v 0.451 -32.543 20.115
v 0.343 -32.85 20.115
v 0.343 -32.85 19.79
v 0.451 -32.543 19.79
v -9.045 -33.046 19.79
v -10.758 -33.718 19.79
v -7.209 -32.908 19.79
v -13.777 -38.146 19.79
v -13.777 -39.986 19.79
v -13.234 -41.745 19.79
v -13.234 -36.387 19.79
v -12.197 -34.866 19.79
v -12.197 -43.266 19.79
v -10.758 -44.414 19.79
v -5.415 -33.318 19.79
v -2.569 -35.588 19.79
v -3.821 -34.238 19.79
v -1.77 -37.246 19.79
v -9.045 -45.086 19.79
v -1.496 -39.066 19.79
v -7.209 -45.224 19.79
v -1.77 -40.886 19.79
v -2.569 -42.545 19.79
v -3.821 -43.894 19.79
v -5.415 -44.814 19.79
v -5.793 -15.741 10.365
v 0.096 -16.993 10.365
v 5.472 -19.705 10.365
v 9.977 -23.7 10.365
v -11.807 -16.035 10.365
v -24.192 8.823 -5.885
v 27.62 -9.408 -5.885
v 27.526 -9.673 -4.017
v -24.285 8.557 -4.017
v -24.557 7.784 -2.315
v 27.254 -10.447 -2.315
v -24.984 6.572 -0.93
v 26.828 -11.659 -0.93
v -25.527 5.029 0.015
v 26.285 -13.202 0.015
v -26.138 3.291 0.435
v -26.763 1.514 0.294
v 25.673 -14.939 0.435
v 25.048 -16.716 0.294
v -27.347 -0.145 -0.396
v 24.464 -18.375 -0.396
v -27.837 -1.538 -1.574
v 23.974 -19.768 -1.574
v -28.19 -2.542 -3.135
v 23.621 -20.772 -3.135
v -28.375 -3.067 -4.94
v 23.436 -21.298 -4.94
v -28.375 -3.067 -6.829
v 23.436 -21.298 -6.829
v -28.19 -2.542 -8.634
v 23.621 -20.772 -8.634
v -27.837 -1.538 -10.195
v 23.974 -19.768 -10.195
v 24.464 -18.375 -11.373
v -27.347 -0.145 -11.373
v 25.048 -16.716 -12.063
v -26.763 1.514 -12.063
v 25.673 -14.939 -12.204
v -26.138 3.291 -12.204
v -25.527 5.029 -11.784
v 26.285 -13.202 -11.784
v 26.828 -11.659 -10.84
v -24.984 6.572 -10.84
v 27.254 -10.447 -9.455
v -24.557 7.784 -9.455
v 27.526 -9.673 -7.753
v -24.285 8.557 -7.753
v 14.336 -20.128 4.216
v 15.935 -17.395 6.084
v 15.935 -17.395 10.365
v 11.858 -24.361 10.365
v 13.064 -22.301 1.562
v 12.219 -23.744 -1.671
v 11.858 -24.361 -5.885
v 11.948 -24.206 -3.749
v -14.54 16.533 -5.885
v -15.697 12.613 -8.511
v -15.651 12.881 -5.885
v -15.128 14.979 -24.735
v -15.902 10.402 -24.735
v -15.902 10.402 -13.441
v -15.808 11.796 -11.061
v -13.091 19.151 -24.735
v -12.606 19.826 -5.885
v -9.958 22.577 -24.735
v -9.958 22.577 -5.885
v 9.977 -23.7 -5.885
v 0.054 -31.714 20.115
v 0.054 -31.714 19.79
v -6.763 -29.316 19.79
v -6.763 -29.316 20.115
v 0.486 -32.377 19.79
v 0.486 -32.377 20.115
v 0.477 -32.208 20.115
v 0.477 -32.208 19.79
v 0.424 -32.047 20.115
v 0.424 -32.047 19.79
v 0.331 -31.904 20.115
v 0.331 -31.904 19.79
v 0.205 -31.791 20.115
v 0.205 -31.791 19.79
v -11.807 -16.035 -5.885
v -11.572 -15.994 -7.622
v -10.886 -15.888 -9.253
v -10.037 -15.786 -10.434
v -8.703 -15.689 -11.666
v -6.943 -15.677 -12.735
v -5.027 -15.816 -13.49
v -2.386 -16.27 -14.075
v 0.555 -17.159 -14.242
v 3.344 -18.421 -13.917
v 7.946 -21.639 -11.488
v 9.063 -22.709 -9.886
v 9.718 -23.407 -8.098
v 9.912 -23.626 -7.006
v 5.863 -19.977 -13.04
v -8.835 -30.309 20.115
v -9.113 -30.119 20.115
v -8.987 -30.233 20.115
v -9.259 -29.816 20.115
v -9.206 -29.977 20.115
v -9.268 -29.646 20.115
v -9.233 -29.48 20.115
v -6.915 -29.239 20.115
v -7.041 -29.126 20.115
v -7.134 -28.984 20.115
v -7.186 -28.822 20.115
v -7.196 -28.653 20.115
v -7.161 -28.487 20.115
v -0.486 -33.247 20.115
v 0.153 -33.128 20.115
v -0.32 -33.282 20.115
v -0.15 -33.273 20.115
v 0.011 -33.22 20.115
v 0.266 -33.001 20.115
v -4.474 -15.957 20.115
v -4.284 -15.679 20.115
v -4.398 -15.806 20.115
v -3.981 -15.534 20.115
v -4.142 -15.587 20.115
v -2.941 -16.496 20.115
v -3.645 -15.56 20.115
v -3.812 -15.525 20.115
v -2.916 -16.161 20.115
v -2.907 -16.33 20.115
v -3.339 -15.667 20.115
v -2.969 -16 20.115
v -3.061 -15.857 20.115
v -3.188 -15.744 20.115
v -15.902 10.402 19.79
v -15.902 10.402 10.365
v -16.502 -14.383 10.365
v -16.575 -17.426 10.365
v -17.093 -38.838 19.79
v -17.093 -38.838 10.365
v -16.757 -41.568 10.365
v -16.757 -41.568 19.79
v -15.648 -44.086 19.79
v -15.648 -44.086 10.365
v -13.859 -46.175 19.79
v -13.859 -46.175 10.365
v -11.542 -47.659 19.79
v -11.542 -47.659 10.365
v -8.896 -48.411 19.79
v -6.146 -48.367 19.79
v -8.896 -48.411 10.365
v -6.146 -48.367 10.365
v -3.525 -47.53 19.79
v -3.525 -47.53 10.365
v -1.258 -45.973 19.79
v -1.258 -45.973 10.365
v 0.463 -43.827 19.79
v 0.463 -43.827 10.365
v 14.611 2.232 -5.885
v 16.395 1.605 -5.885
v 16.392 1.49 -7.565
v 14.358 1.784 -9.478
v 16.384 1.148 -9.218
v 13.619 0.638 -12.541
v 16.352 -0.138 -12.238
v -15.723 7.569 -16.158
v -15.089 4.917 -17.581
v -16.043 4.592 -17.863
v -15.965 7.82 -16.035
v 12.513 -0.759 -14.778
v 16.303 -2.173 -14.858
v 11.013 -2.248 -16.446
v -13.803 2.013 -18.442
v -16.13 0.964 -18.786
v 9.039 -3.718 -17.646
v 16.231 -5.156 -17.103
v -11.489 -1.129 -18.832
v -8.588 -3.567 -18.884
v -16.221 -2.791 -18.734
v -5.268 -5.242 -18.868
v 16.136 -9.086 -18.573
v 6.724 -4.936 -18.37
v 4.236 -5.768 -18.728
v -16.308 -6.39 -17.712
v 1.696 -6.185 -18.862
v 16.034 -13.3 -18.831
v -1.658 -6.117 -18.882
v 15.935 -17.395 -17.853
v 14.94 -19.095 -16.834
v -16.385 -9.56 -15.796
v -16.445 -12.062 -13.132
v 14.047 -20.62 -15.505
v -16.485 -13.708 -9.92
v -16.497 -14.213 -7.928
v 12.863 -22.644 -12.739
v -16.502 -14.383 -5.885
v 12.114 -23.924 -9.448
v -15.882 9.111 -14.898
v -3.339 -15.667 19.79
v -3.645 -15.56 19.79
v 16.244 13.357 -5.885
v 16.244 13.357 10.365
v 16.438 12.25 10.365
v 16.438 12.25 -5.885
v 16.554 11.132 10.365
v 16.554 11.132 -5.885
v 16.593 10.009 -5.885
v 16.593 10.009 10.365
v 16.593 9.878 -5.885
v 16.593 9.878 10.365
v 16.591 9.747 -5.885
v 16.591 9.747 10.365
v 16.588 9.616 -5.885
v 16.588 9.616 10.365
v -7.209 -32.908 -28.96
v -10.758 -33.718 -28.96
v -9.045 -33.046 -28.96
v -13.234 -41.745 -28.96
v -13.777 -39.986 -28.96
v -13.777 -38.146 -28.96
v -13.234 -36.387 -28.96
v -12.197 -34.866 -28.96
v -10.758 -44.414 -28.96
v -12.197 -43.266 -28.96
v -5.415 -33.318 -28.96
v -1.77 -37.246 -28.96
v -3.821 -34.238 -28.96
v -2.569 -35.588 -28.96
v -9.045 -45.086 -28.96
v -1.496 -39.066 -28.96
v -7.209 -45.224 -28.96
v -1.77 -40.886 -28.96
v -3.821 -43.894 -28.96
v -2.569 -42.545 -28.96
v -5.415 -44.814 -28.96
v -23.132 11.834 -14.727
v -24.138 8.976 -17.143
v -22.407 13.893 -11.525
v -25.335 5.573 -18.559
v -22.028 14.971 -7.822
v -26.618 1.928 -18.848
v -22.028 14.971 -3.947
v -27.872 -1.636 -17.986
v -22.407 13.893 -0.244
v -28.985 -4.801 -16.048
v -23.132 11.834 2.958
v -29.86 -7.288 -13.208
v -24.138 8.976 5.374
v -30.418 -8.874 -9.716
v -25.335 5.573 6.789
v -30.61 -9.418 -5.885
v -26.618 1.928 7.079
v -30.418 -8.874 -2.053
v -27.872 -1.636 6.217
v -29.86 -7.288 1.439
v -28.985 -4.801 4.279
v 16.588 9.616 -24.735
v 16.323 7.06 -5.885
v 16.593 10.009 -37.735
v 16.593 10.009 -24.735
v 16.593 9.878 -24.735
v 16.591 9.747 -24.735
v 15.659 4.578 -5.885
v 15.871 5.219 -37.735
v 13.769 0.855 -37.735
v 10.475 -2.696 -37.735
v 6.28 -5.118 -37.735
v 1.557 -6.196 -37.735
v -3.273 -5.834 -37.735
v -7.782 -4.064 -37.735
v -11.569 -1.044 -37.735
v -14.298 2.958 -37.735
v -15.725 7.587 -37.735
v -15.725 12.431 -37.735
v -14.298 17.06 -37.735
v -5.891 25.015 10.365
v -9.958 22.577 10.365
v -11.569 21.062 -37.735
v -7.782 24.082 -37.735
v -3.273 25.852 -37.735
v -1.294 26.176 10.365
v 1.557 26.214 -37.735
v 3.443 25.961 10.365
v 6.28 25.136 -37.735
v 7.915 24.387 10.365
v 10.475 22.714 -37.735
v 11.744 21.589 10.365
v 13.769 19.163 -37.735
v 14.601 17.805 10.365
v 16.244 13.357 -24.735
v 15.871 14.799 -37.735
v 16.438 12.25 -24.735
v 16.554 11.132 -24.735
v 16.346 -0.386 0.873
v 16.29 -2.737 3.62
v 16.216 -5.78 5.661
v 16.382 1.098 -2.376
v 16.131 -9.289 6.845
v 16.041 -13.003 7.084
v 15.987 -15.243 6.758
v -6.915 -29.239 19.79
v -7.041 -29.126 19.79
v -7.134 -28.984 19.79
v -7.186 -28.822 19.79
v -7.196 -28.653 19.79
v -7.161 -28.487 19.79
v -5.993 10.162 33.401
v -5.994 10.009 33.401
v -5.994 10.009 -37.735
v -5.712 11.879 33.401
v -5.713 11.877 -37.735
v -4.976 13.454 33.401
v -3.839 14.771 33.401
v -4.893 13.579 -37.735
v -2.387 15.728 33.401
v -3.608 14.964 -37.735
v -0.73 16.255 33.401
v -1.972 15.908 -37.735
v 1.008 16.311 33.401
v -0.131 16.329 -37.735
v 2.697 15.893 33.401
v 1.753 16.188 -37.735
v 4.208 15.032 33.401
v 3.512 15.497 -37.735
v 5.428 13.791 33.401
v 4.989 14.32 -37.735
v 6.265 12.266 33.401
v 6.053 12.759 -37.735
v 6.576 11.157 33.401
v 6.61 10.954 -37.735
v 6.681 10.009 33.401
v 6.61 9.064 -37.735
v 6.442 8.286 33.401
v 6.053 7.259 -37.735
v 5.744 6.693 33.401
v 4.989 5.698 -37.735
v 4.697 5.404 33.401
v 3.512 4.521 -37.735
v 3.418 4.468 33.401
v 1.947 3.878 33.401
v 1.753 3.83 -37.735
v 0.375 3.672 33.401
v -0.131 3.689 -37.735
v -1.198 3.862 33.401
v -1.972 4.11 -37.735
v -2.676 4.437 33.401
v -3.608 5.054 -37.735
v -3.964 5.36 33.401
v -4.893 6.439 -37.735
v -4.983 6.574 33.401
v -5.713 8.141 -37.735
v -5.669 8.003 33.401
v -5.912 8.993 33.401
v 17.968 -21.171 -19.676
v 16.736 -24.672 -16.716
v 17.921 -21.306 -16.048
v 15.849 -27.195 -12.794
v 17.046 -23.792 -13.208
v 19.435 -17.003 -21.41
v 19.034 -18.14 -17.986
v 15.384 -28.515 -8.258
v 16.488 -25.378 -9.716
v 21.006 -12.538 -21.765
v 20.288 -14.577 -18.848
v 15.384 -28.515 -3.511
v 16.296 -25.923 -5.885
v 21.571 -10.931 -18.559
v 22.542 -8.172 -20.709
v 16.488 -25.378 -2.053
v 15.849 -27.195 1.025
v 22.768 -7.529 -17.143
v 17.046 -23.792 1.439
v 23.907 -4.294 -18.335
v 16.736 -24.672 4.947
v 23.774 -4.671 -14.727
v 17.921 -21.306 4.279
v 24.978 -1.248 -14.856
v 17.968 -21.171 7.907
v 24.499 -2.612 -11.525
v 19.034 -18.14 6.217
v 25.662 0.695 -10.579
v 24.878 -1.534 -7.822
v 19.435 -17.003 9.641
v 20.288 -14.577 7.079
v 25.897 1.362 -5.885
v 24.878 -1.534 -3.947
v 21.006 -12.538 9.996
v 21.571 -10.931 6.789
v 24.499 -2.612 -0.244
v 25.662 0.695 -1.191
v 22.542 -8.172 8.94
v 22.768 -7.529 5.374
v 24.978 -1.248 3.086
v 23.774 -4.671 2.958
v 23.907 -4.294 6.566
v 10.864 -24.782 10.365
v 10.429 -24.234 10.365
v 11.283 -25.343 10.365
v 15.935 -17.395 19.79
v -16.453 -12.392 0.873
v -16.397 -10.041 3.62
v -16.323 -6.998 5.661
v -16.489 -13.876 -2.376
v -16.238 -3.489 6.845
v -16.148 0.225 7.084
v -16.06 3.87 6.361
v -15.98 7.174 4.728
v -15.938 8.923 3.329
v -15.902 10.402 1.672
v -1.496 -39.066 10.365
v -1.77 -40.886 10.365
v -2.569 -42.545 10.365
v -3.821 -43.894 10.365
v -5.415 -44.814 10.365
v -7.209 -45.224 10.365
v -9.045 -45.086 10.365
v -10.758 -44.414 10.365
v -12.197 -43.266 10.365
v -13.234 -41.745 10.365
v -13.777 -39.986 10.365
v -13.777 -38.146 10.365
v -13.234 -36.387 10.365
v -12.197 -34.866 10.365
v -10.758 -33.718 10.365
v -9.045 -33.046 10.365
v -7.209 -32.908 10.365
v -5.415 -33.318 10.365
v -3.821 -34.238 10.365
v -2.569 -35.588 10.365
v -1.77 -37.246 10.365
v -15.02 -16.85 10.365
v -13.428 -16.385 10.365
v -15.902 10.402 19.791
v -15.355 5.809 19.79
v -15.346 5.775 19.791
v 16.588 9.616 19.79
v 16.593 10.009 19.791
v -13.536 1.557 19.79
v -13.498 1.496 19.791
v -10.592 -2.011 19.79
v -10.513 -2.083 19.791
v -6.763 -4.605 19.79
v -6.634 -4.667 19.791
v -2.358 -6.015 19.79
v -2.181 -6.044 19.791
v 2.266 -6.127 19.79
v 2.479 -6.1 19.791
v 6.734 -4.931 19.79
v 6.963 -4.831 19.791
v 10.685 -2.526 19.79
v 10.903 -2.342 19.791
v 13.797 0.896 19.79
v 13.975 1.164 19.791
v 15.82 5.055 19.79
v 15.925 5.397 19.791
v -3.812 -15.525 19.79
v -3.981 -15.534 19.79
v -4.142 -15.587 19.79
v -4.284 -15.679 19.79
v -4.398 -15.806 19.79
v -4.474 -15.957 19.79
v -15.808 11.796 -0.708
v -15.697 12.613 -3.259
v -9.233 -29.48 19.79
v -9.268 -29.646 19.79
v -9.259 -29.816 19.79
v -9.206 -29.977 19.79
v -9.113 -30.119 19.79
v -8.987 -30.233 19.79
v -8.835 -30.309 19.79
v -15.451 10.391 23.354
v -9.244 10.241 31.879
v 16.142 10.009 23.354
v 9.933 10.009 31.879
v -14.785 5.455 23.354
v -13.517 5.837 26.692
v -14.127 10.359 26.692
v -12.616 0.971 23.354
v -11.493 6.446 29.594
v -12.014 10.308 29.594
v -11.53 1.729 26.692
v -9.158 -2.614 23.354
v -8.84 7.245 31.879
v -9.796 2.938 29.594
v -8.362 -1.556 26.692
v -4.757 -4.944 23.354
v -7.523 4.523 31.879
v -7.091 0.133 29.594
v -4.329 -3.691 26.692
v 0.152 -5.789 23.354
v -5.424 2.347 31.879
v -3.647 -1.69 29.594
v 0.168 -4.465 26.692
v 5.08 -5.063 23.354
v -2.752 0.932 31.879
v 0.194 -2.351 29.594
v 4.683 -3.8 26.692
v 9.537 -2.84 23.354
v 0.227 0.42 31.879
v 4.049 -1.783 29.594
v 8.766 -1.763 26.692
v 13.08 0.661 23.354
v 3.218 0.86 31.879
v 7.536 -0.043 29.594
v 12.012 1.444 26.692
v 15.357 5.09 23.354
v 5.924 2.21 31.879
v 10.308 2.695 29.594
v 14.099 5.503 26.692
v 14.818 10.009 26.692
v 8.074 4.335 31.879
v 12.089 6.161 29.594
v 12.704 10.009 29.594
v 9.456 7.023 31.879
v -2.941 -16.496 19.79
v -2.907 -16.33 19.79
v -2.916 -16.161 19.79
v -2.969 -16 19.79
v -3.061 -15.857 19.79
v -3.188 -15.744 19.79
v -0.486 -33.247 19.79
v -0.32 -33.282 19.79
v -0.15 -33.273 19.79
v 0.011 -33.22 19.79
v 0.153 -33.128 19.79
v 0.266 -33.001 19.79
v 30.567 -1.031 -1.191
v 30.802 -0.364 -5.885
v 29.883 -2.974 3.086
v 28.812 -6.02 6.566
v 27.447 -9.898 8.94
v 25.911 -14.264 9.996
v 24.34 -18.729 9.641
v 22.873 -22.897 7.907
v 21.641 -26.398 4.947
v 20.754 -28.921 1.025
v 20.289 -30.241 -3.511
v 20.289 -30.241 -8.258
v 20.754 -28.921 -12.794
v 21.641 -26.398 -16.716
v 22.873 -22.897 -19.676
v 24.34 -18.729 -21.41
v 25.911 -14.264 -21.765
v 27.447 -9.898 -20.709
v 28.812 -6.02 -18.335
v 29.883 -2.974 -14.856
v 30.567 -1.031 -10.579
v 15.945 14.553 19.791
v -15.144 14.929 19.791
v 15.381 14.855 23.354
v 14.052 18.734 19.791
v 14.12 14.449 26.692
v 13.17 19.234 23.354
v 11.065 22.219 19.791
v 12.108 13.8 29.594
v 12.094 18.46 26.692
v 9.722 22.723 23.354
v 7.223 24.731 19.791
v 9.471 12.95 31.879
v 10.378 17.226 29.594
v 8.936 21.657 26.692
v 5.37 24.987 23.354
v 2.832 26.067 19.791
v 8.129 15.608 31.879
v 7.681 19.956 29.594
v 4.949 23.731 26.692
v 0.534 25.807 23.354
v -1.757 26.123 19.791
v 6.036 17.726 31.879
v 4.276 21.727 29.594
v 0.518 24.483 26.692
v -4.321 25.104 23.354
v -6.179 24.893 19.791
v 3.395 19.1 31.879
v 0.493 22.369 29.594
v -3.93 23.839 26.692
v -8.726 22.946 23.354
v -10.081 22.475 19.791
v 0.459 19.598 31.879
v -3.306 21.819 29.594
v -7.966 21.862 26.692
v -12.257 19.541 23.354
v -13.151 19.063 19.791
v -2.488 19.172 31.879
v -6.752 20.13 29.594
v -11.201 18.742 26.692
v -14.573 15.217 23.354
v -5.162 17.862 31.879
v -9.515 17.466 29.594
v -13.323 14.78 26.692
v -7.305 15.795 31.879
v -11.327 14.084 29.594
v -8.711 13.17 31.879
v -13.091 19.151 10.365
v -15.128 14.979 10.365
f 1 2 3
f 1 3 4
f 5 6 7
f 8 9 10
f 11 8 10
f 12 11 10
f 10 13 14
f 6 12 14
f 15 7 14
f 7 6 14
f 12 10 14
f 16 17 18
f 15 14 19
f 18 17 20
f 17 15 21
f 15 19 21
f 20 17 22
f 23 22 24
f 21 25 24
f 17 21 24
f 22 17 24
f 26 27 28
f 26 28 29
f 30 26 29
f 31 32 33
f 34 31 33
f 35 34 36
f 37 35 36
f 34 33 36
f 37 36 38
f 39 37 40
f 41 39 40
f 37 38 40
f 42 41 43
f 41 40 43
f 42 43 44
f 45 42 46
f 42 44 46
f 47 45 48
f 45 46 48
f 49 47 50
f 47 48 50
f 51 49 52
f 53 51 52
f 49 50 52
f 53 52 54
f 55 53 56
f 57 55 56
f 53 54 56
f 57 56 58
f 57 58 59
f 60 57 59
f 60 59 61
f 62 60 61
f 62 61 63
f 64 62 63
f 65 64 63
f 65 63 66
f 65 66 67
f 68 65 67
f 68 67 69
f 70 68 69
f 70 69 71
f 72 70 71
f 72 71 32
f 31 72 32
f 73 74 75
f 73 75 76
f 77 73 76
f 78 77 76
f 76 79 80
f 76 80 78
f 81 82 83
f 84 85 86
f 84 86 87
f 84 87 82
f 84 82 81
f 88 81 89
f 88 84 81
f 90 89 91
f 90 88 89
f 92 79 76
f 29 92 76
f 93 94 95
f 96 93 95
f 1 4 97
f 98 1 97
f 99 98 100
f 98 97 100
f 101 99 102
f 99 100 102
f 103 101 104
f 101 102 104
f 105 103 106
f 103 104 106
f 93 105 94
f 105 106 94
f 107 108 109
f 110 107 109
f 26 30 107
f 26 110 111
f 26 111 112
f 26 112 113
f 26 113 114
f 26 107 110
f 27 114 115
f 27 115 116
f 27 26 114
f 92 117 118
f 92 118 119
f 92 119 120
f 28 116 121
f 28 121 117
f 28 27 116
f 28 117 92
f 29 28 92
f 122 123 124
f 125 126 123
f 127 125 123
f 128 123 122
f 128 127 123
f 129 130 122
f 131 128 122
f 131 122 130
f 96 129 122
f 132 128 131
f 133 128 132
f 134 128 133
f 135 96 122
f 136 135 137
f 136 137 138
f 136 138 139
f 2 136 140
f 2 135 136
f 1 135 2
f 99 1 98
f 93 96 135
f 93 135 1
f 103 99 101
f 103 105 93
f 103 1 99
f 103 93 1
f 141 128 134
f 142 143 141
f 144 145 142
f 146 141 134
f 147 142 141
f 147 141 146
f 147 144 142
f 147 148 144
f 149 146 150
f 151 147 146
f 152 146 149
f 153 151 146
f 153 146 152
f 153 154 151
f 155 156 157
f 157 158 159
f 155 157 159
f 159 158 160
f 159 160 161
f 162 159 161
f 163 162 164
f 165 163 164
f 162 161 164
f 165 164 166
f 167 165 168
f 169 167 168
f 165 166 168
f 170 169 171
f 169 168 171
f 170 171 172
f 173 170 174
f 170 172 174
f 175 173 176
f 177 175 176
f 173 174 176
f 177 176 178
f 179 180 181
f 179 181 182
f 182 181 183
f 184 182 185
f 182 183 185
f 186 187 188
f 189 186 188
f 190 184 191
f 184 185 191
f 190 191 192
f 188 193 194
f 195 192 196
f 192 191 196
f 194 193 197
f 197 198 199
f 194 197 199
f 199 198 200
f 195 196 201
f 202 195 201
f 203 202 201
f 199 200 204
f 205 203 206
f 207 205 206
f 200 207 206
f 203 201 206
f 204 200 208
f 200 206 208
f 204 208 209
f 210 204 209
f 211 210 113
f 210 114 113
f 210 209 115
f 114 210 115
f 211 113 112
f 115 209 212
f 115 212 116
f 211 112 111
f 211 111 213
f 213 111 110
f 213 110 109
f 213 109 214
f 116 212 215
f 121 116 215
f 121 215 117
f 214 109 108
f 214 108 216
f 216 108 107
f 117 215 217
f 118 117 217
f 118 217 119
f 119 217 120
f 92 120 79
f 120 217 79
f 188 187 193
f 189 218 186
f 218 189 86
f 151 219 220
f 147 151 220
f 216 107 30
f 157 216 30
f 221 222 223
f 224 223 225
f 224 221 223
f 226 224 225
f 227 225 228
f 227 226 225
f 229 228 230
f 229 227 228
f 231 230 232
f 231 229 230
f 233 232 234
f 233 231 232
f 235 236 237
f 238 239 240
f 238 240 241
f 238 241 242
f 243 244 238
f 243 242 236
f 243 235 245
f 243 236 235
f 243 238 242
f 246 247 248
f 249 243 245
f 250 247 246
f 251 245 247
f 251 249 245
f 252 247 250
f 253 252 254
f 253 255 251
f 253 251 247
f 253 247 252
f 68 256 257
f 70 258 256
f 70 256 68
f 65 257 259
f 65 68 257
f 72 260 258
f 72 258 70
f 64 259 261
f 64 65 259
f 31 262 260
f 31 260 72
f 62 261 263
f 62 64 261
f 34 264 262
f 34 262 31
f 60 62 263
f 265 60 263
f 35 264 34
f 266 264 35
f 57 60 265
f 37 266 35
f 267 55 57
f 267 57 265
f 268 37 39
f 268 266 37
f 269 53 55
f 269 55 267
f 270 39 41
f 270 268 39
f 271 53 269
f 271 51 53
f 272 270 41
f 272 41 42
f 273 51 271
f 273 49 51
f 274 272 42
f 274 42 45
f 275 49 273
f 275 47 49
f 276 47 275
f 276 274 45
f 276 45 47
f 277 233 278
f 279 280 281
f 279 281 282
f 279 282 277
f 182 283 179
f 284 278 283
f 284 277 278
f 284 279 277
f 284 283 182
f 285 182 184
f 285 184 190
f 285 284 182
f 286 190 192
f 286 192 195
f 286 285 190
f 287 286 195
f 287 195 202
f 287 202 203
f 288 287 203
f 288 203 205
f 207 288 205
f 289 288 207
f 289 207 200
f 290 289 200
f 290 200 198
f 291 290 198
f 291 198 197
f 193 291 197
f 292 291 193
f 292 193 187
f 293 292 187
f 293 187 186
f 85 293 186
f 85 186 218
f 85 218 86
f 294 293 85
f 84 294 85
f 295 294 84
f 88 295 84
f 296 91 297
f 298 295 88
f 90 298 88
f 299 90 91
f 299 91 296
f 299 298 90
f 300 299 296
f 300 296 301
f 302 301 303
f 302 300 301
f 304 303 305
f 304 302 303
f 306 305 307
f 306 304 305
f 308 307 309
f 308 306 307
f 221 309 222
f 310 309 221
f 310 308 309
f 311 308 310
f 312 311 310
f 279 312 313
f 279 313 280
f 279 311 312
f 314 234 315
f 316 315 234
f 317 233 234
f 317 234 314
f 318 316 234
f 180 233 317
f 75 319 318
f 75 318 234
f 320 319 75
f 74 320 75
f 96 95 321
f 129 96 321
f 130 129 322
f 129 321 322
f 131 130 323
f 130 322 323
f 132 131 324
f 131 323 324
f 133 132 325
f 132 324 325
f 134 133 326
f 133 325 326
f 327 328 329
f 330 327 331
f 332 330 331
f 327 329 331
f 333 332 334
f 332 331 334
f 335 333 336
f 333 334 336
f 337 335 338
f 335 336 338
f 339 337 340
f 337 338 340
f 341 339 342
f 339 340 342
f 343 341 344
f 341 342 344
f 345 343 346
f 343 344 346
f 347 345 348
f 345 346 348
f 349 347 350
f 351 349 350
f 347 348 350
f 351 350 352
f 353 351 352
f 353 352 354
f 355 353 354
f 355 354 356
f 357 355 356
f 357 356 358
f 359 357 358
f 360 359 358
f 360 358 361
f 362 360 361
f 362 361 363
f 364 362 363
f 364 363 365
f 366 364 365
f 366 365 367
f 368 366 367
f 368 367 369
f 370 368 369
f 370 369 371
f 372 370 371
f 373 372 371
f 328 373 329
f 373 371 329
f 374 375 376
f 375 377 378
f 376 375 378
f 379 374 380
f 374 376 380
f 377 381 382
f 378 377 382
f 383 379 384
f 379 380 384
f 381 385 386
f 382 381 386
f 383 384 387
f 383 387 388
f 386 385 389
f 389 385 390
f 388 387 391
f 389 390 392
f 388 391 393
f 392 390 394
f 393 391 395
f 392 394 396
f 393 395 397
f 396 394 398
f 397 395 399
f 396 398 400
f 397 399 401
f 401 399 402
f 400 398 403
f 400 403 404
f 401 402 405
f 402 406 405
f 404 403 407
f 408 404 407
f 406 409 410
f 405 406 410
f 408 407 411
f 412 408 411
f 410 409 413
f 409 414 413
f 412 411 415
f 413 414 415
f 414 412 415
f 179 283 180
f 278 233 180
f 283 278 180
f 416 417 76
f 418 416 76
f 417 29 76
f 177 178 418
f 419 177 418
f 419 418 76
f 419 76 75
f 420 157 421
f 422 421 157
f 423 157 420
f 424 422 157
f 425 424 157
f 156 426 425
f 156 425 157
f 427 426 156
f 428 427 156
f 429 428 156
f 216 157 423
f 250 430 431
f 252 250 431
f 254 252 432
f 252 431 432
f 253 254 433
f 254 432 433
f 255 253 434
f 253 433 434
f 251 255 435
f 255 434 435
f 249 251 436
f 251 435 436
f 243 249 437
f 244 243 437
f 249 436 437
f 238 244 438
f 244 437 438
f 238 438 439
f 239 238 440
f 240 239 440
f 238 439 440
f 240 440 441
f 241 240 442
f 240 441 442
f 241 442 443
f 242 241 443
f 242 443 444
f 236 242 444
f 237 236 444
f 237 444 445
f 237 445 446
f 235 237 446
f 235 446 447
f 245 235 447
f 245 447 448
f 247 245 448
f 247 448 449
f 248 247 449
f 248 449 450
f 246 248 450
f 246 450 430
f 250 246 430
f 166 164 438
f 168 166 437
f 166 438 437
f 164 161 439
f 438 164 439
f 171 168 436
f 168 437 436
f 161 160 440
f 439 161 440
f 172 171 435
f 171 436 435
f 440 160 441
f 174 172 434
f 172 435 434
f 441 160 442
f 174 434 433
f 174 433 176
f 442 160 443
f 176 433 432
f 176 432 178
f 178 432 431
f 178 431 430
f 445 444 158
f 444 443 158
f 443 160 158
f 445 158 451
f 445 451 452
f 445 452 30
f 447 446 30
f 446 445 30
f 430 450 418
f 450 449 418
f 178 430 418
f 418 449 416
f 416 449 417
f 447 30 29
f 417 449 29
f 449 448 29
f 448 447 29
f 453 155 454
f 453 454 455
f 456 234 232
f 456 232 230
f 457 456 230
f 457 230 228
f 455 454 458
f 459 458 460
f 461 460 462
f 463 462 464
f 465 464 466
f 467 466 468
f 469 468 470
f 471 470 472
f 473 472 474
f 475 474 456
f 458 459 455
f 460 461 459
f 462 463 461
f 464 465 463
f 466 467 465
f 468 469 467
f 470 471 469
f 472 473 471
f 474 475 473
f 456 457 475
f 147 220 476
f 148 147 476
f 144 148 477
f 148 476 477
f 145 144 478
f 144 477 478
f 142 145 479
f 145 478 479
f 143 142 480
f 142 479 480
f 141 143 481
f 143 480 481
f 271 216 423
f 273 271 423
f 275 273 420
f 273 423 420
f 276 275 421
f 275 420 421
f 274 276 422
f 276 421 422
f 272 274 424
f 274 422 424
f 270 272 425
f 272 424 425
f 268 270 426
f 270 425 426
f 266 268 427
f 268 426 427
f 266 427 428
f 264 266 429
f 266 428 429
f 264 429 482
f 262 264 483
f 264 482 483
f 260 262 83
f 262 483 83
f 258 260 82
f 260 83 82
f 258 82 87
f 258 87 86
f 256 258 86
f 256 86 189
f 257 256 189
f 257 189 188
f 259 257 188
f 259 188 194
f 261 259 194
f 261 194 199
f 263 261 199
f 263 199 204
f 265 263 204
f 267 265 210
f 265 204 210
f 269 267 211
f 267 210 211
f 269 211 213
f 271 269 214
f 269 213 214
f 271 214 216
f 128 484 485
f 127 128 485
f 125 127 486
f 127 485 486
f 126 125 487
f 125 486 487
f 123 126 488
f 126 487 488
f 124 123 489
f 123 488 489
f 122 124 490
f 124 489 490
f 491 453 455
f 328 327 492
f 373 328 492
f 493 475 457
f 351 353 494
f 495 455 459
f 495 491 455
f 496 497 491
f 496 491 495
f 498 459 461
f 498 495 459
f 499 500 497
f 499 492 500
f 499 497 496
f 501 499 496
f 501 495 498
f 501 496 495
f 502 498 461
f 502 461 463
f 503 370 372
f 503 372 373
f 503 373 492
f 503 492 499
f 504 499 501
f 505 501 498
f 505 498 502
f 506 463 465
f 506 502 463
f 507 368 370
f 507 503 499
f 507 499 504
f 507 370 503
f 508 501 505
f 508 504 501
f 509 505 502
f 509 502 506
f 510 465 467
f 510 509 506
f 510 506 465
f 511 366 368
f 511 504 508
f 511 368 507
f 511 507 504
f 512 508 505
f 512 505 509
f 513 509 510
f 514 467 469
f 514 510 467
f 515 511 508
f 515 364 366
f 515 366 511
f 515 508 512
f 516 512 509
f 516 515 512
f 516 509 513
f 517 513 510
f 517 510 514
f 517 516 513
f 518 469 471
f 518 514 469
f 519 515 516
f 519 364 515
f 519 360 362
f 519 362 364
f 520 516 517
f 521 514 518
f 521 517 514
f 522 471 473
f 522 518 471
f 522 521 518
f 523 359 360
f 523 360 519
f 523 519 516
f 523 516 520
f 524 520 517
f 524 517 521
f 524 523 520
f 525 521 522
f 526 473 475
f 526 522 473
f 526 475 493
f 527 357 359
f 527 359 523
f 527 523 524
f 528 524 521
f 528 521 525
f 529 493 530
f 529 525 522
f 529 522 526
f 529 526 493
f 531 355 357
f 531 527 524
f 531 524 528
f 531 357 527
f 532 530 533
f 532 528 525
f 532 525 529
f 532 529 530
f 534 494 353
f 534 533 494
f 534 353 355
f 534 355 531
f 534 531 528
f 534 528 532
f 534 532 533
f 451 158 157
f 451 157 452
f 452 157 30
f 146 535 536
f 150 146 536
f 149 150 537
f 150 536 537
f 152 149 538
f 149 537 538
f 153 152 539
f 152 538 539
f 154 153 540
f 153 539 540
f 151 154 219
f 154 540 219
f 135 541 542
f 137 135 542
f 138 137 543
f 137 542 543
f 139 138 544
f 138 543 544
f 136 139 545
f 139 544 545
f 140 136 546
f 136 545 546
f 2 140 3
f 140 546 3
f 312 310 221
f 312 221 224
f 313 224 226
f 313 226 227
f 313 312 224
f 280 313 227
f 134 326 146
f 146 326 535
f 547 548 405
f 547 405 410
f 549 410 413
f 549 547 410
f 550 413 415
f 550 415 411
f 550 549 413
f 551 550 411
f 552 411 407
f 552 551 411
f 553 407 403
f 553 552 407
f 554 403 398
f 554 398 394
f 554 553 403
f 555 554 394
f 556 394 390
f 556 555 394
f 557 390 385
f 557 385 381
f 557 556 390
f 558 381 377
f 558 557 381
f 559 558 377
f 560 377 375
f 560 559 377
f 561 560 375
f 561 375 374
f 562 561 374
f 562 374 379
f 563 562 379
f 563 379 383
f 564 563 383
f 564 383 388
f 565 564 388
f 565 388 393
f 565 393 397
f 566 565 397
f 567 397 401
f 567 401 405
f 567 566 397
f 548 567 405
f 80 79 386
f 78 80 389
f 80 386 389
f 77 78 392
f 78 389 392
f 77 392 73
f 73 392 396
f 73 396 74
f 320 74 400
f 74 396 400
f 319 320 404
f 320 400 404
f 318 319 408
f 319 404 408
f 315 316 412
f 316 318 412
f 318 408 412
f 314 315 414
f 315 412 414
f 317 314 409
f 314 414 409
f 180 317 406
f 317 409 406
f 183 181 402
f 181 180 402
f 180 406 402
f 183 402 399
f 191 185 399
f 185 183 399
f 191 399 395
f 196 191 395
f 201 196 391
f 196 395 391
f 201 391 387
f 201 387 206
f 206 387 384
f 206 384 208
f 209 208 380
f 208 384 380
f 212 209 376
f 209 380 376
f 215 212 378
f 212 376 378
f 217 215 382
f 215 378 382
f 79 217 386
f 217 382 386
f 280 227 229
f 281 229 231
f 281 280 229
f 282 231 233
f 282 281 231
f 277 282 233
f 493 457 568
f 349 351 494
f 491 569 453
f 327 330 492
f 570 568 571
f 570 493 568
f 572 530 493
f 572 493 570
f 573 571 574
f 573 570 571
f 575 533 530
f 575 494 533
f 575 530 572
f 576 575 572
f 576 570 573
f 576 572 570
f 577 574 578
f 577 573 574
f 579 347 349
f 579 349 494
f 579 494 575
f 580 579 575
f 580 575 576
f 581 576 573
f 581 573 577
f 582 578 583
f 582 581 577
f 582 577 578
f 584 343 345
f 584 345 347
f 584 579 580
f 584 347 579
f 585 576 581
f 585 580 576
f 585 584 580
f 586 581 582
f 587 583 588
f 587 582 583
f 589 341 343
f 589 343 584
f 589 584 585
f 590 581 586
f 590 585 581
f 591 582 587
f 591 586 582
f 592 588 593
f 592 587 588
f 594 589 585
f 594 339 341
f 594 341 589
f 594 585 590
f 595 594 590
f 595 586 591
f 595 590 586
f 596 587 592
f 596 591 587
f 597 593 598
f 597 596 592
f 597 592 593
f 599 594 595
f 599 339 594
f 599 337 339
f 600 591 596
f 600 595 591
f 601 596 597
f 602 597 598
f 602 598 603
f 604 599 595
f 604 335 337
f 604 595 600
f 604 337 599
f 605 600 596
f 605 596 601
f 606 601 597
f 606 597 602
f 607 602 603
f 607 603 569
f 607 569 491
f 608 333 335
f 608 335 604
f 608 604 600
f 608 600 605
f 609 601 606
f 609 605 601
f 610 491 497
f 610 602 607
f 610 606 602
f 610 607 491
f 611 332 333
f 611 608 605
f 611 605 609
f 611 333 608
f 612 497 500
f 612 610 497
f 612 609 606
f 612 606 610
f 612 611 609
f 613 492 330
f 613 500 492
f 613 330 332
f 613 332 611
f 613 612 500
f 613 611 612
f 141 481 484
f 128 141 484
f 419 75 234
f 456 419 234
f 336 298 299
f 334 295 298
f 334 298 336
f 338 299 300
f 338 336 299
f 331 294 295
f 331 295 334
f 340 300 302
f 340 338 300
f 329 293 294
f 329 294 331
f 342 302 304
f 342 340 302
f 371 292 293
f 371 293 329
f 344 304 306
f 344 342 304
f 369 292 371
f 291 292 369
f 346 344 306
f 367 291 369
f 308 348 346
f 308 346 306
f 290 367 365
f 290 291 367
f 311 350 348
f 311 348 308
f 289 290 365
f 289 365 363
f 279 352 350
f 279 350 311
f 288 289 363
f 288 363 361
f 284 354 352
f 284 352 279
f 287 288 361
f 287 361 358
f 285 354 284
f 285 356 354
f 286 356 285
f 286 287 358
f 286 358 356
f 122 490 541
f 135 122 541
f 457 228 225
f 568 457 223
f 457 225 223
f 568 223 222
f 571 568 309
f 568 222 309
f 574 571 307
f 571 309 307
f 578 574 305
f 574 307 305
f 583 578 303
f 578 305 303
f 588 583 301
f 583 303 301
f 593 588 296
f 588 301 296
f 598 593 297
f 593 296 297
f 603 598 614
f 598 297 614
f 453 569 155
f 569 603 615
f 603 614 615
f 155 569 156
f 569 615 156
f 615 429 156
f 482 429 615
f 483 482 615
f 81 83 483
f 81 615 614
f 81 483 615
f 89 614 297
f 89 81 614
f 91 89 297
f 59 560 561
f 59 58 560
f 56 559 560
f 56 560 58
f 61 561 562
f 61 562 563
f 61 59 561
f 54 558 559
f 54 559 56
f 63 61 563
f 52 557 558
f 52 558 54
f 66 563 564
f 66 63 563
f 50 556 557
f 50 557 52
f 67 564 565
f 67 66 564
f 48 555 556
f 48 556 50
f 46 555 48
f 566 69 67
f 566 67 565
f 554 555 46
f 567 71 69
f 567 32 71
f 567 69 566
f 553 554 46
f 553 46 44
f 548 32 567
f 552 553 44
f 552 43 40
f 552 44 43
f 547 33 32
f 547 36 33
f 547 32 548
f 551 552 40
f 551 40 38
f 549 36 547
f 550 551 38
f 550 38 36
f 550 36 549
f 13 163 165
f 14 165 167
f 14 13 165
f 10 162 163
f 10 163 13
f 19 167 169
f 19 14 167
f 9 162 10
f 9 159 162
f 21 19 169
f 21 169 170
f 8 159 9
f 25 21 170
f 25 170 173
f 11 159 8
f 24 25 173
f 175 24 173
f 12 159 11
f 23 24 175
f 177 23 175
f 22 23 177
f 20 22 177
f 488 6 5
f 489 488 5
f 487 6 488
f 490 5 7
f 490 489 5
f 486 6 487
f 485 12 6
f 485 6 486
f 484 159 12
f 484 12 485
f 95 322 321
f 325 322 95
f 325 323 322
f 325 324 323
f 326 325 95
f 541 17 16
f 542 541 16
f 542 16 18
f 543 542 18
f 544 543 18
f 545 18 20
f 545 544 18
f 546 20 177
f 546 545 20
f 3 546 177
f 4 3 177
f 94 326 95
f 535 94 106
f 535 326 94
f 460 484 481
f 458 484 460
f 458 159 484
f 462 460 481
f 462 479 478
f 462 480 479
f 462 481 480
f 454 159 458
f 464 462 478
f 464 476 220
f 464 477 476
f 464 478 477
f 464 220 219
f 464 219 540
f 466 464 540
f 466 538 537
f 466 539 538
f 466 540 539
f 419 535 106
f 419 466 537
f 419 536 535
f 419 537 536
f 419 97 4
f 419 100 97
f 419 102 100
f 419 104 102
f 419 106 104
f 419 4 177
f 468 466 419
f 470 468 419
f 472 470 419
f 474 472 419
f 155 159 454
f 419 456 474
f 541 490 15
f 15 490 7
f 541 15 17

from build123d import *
from build123d.topology import SkipClean

# Parameters (mm, degrees)
BOSS_EXTRU_1_DEPTH       = 1.45
ESQUISSE2_R              = 2.5
BOSS_EXTRU_2_DEPTH       = 2.2
BOSS_EXTRU_3_START       = 7.4
ESQUISSE4_R              = 2.5
BOSS_EXTRU_3_DEPTH       = 11.05
BOSS_EXTRU_4_START       = -1.45
ESQUISSE5_R              = 0.95
BOSS_EXTRU_4_DEPTH       = 7.5
CONG_2_R                 = 2.2
BOSS_EXTRU_5_DEPTH       = 1
BOSS_EXTRU_5_DEPTH_BACK  = 7.45
ENL_V_START              = -5.4
ENL_V_MAT_EXTRU_7_DEPTH  = 5.4
BOSS_EXTRU_14_DEPTH      = 1
BOSS_EXTRU_14_DEPTH_BACK = 7.45
ESQUISSE14_R             = 2
ESQUISSE15_R             = 2.45
BOSS_EXTRU_15_DEPTH      = 0.8
ENL_V_START_2            = -6.05
ESQUISSE16_R             = 3.6
ESQUISSE16_R_2           = 0.95
ENL_V_MAT_EXTRU_9_DEPTH  = 6.05
ESQUISSE17_R             = 0.975
ENL_V_MAT_EXTRU_10_DEPTH = 12.8
ESQUISSE18_R             = 0.975
ENL_V_MAT_EXTRU_11_DEPTH = 12.8
BOSS_EXTRU_16_DEPTH      = 0.05
SCALE1_SCALE             = 6.5


with BuildPart() as part:
    # Esquisse1 → Boss.-Extru.1 (new body)
    with BuildSketch(Plane.XY):
        with BuildLine():
            Line((-2.499269345, 0.060437906), (-2.682459021, -7.514946015))
            ThreePointArc((-2.682459021, -7.514946015), (-1.629243216, -8.944775402), (0.018499188, -8.282491037))
            Line((0.018499188, -8.282491037), (2.398777572, -4.216041966))
            Line((2.398777572, -4.216041966), (2.499269345, -0.060437906))
            ThreePointArc((2.499269345, -0.060437906), (0.060437906, 2.499269345), (-2.499269345, 0.060437906))
        make_face()
    extrude(amount=BOSS_EXTRU_1_DEPTH)

    # Esquisse2 → Boss.-Extru.2 (add)
    with BuildSketch(Plane.XY.offset(1.45)):
        with Locations(Location((0, 0, 0), (0, 0, 178.614730271))):
            Circle(ESQUISSE2_R)
    extrude(amount=BOSS_EXTRU_2_DEPTH)

    # Esquisse4 → Boss.-Extru.3 (add)
    with SkipClean():  # the faces are left unmerged after this step: merging them gives an invalid solid
        with BuildSketch(Plane(origin=(0, 0, 0), x_dir=(-1, 0, 0), z_dir=(0, 0, -1)).offset(BOSS_EXTRU_3_START)):
            with Locations(Location((0, 0, 0), (0, 0, 180))):
                Circle(ESQUISSE4_R)
        extrude(amount=-BOSS_EXTRU_3_DEPTH)
    add(part.part.scale(1), mode=Mode.REPLACE)  # the faces are merged on a copy

    # Esquisse5 → Boss.-Extru.4 (add)
    with SkipClean():  # the faces are left unmerged after this step: merging them gives an invalid solid
        with BuildSketch(Plane(origin=(0, 0, 0), x_dir=(-1, 0, 0), z_dir=(0, 0, -1)).offset(BOSS_EXTRU_4_START)):
            with Locations(Location((1.232882801, -7.55, 0), (0, 0, 180))):
                Circle(ESQUISSE5_R)
        extrude(amount=BOSS_EXTRU_4_DEPTH)

    # Congé2
    cong_2_edges = [part.edges().sort_by_distance(p)[0] for p in [
        (0.030221161, 2.49981733, 3.65),
    ]]
    fillet(cong_2_edges, radius=CONG_2_R - 0.0001)  # a hair under: the kernel refuses the full size

    # Esquisse6 → Boss.-Extru.5 (add, two sides: drawn at the far end of the back side and taken through both)
    with BuildSketch(Plane(origin=(-2.358270057, 0.829796565, 0), x_dir=(0, 0, 1), z_dir=(-0.9433080226536918, 0.3319186261678939, 0)).offset(-BOSS_EXTRU_5_DEPTH_BACK)):
        with BuildLine():
            Line((-2.5, -4.4), (0, -4.4))
            Line((0, -4.4), (0, 1.297884729))
            Line((0, 1.297884729), (-2.5, 1.297884729))
            Line((-2.5, 1.297884729), (-2.5, -0.4))
            ThreePointArc((-2.5, -0.4), (-4.5, -2.4), (-2.5, -4.4))
        make_face()
    extrude(amount=BOSS_EXTRU_5_DEPTH + BOSS_EXTRU_5_DEPTH_BACK)

    # Esquisse13 → Enlèv. mat.-Extru.7 (cut)
    with SkipClean():  # the faces are left unmerged after this step: merging them gives an invalid solid
        with BuildSketch(Plane.XY.offset(ENL_V_START)):
            with BuildLine():
                Line((-1.584775977, 1.933516253), (-2.870785963, 2.386020269))
                Line((-2.870785963, 2.386020269), (-4.762020034, -2.988840108))
                Line((-4.762020034, -2.988840108), (-2.591476667, -3.752581914))
                Line((-2.591476667, -3.752581914), (-2.499269345, 0.060437906))
                ThreePointArc((-2.499269345, 0.060437906), (-2.246544496, 1.096830811), (-1.584775977, 1.933516253))
            make_face()
            with BuildLine():
                Line((1.771456427, -5.28775253), (3.208932757, -5.793552499))
                Line((3.208932757, -5.793552499), (5.100166828, -0.418692123))
                Line((5.100166828, -0.418692123), (2.446360209, 0.515093901))
                ThreePointArc((2.446360209, 0.515093901), (2.489502388, 0.228862104), (2.499269345, -0.060437906))
                Line((2.499269345, -0.060437906), (2.398777572, -4.216041966))
                Line((2.398777572, -4.216041966), (1.771456427, -5.28775253))
            make_face()
        extrude(amount=ENL_V_MAT_EXTRU_7_DEPTH, mode=Mode.SUBTRACT)

    # Esquisse14 → Boss.-Extru.14 (add, two sides: drawn at the far end of the back side and taken through both)
    with BuildSketch(Plane(origin=(-2.358270057, 0.829796565, 0), x_dir=(0, 0, 1), z_dir=(-0.9433080226536918, 0.3319186261678939, 0)).offset(-BOSS_EXTRU_14_DEPTH_BACK)):
        with Locations(Location((-2.5, -2.4, 0), (0, 0, 270))):
            Circle(ESQUISSE14_R)
    extrude(amount=BOSS_EXTRU_14_DEPTH + BOSS_EXTRU_14_DEPTH_BACK)

    # Esquisse15 → Boss.-Extru.15 (add)
    with BuildSketch(Plane(origin=(4.669374712, -1.6429972, 0), x_dir=(0, 0, -1), z_dir=(0.9433080226536918, -0.33191862616789397, 0))):
        with Locations(Location((2.5, -2.4, 0), (0, 0, 90))):
            Circle(ESQUISSE15_R)
    extrude(amount=-BOSS_EXTRU_15_DEPTH)

    # Esquisse16 → Enlèv. mat.-Extru.9 (cut)
    with BuildSketch(Plane(origin=(0, 0, -6.05), x_dir=(-1, 0, 0), z_dir=(0, 0, -1)).offset(ENL_V_START_2)):
        with Locations((1.232882801, -7.55)):
            Circle(ESQUISSE16_R)
        with Locations(Location((1.232882801, -7.55, 0), (0, 0, 180))):
            Circle(ESQUISSE16_R_2, mode=Mode.SUBTRACT)
    extrude(amount=ENL_V_MAT_EXTRU_9_DEPTH, mode=Mode.SUBTRACT)

    # Esquisse17 → Enlèv. mat.-Extru.10 (cut)
    with BuildSketch(Plane(origin=(0, 0, -7.4), x_dir=(-1, 0, 0), z_dir=(0, 0, -1))):
        Circle(ESQUISSE17_R)
    extrude(amount=-ENL_V_MAT_EXTRU_10_DEPTH, mode=Mode.SUBTRACT)

    # Esquisse18 → Enlèv. mat.-Extru.11 (cut)
    with BuildSketch(Plane(origin=(4.669374712, -1.6429972, 0), x_dir=(0, 0, -1), z_dir=(0.9433080226536918, -0.33191862616789397, 0))):
        with Locations(Location((2.5, -2.4, 0), (0, 0, 90))):
            Circle(ESQUISSE18_R)
    extrude(amount=-ENL_V_MAT_EXTRU_11_DEPTH, mode=Mode.SUBTRACT)

    # Esquisse19 → Boss.-Extru.16 (add)
    with BuildSketch(Plane.XY.offset(1.45)):
        with BuildLine():
            Line((-0.741145926, -3.994756307), (-1.473216513, -6.075290521))
            ThreePointArc((-1.473216513, -6.075290521), (-1.469057852, -6.151714142), (-1.412077574, -6.202813186))
            Line((-1.412077574, -6.202813186), (-0.127522665, -6.654805208))
            ThreePointArc((-0.127522665, -6.654805208), (-0.051099043, -6.650646547), (0, -6.593666268))
            Line((0, -6.593666268), (0.016595931, -6.546500867))
            ThreePointArc((0.016595931, -6.546500867), (0.01243727, -6.470077246), (-0.044543008, -6.418978202))
            Line((-0.044543008, -6.418978202), (-1.093270911, -6.049965837))
            ThreePointArc((-1.093270911, -6.049965837), (-1.15025119, -5.998866793), (-1.154409851, -5.922443172))
            Line((-1.154409851, -5.922443172), (-0.50531892, -4.077735963))
            ThreePointArc((-0.50531892, -4.077735963), (-0.509477582, -4.001312342), (-0.56645786, -3.950213298))
            Line((-0.56645786, -3.950213298), (-0.613623261, -3.933617367))
            ThreePointArc((-0.613623261, -3.933617367), (-0.690046883, -3.937776028), (-0.741145926, -3.994756307))
        make_face()
    extrude(amount=BOSS_EXTRU_16_DEPTH)


with BuildPart() as part_1:
    # Scale1: scaled about (-0.062378665, -1.819814111, -1.884608328)
    add(part.part.scale(SCALE1_SCALE).moved(Location((0.343082657, 10.00897761, 10.365345804))))


solid = part_1.part
